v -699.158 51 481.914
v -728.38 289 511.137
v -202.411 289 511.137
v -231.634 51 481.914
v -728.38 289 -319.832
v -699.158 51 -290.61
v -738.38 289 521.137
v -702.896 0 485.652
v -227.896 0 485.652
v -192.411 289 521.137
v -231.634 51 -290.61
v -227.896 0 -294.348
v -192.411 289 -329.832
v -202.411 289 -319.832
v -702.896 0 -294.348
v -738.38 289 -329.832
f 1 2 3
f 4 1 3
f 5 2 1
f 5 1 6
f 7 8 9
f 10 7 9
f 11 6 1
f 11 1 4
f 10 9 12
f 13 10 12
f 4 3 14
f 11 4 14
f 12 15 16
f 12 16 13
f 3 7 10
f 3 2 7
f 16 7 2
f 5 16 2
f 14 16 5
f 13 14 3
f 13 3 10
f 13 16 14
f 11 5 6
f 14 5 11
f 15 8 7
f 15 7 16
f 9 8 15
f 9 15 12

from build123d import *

# Parameters (mm, degrees)
SKETCH_1_W          = 475
SKETCH_1_H          = 780
EXTRUDE_1_DEPTH     = 289
EXTRUDE_1_DRAFT     = -7
SKETCH_2_W          = 525.969476202
SKETCH_2_H          = 830.969476202
CUT_EXTRUDE_1_DEPTH = 238
CUT_EXTRUDE_1_DRAFT = -7


with BuildPart() as part:
    # Эскиз1 → Бобышка-Вытянуть1 (with draft: the straight prism first)
    with BuildSketch(Plane(origin=(0, 0, 0), x_dir=(1, 0, 0), z_dir=(0, 1, 0))):
        with Locations((-465.395753162, -95.652339489)):
            Rectangle(SKETCH_1_W, SKETCH_1_H)
    extrude(amount=EXTRUDE_1_DEPTH)
    # Бобышка-Вытянуть1: the draft: its side faces are tilted about the plane it starts from
    extrude_1_sides = [part.faces().sort_by_distance(p)[0] for p in [
        (-465.395753162, 144.5, -294.347660511),
        (-702.895753162, 144.5, 95.652339489),
        (-465.395753162, 144.5, 485.652339489),
        (-227.895753162, 144.5, 95.652339489),
    ]]
    draft(extrude_1_sides, Plane(origin=(0, 0, 0), x_dir=(1, 0, 0), z_dir=(0, 1, 0)), EXTRUDE_1_DRAFT)


with BuildPart() as cut_extrude_1_tool:
    # Эскиз2 → Вырез-Вытянуть1 (with draft: the straight prism first)
    with BuildSketch(Plane(origin=(0, 289, 0), x_dir=(1, 0, 0), z_dir=(0, 1, 0))):
        with Locations((-465.395753162, -95.652339489)):
            Rectangle(SKETCH_2_W, SKETCH_2_H)
    extrude(amount=-CUT_EXTRUDE_1_DEPTH)
    # Вырез-Вытянуть1: the draft: its side faces are tilted about the plane it starts from
    cut_extrude_1_sides = [cut_extrude_1_tool.faces().sort_by_distance(p)[0] for p in [
        (-728.380491263, 170, 95.652339489),
        (-465.395753162, 170, 511.13707759),
        (-202.411015061, 170, 95.652339489),
        (-465.395753162, 170, -319.832398612),
    ]]
    draft(cut_extrude_1_sides, Plane(origin=(0, 289, 0), x_dir=(1, 0, 0), z_dir=(0, 1, 0)), CUT_EXTRUDE_1_DRAFT)


with BuildPart() as part_1:
    add(part.part)

    # Вырез-Вытянуть1: cut by cut_extrude_1_tool
    add(cut_extrude_1_tool.part, mode=Mode.SUBTRACT)


solid = part_1.part
